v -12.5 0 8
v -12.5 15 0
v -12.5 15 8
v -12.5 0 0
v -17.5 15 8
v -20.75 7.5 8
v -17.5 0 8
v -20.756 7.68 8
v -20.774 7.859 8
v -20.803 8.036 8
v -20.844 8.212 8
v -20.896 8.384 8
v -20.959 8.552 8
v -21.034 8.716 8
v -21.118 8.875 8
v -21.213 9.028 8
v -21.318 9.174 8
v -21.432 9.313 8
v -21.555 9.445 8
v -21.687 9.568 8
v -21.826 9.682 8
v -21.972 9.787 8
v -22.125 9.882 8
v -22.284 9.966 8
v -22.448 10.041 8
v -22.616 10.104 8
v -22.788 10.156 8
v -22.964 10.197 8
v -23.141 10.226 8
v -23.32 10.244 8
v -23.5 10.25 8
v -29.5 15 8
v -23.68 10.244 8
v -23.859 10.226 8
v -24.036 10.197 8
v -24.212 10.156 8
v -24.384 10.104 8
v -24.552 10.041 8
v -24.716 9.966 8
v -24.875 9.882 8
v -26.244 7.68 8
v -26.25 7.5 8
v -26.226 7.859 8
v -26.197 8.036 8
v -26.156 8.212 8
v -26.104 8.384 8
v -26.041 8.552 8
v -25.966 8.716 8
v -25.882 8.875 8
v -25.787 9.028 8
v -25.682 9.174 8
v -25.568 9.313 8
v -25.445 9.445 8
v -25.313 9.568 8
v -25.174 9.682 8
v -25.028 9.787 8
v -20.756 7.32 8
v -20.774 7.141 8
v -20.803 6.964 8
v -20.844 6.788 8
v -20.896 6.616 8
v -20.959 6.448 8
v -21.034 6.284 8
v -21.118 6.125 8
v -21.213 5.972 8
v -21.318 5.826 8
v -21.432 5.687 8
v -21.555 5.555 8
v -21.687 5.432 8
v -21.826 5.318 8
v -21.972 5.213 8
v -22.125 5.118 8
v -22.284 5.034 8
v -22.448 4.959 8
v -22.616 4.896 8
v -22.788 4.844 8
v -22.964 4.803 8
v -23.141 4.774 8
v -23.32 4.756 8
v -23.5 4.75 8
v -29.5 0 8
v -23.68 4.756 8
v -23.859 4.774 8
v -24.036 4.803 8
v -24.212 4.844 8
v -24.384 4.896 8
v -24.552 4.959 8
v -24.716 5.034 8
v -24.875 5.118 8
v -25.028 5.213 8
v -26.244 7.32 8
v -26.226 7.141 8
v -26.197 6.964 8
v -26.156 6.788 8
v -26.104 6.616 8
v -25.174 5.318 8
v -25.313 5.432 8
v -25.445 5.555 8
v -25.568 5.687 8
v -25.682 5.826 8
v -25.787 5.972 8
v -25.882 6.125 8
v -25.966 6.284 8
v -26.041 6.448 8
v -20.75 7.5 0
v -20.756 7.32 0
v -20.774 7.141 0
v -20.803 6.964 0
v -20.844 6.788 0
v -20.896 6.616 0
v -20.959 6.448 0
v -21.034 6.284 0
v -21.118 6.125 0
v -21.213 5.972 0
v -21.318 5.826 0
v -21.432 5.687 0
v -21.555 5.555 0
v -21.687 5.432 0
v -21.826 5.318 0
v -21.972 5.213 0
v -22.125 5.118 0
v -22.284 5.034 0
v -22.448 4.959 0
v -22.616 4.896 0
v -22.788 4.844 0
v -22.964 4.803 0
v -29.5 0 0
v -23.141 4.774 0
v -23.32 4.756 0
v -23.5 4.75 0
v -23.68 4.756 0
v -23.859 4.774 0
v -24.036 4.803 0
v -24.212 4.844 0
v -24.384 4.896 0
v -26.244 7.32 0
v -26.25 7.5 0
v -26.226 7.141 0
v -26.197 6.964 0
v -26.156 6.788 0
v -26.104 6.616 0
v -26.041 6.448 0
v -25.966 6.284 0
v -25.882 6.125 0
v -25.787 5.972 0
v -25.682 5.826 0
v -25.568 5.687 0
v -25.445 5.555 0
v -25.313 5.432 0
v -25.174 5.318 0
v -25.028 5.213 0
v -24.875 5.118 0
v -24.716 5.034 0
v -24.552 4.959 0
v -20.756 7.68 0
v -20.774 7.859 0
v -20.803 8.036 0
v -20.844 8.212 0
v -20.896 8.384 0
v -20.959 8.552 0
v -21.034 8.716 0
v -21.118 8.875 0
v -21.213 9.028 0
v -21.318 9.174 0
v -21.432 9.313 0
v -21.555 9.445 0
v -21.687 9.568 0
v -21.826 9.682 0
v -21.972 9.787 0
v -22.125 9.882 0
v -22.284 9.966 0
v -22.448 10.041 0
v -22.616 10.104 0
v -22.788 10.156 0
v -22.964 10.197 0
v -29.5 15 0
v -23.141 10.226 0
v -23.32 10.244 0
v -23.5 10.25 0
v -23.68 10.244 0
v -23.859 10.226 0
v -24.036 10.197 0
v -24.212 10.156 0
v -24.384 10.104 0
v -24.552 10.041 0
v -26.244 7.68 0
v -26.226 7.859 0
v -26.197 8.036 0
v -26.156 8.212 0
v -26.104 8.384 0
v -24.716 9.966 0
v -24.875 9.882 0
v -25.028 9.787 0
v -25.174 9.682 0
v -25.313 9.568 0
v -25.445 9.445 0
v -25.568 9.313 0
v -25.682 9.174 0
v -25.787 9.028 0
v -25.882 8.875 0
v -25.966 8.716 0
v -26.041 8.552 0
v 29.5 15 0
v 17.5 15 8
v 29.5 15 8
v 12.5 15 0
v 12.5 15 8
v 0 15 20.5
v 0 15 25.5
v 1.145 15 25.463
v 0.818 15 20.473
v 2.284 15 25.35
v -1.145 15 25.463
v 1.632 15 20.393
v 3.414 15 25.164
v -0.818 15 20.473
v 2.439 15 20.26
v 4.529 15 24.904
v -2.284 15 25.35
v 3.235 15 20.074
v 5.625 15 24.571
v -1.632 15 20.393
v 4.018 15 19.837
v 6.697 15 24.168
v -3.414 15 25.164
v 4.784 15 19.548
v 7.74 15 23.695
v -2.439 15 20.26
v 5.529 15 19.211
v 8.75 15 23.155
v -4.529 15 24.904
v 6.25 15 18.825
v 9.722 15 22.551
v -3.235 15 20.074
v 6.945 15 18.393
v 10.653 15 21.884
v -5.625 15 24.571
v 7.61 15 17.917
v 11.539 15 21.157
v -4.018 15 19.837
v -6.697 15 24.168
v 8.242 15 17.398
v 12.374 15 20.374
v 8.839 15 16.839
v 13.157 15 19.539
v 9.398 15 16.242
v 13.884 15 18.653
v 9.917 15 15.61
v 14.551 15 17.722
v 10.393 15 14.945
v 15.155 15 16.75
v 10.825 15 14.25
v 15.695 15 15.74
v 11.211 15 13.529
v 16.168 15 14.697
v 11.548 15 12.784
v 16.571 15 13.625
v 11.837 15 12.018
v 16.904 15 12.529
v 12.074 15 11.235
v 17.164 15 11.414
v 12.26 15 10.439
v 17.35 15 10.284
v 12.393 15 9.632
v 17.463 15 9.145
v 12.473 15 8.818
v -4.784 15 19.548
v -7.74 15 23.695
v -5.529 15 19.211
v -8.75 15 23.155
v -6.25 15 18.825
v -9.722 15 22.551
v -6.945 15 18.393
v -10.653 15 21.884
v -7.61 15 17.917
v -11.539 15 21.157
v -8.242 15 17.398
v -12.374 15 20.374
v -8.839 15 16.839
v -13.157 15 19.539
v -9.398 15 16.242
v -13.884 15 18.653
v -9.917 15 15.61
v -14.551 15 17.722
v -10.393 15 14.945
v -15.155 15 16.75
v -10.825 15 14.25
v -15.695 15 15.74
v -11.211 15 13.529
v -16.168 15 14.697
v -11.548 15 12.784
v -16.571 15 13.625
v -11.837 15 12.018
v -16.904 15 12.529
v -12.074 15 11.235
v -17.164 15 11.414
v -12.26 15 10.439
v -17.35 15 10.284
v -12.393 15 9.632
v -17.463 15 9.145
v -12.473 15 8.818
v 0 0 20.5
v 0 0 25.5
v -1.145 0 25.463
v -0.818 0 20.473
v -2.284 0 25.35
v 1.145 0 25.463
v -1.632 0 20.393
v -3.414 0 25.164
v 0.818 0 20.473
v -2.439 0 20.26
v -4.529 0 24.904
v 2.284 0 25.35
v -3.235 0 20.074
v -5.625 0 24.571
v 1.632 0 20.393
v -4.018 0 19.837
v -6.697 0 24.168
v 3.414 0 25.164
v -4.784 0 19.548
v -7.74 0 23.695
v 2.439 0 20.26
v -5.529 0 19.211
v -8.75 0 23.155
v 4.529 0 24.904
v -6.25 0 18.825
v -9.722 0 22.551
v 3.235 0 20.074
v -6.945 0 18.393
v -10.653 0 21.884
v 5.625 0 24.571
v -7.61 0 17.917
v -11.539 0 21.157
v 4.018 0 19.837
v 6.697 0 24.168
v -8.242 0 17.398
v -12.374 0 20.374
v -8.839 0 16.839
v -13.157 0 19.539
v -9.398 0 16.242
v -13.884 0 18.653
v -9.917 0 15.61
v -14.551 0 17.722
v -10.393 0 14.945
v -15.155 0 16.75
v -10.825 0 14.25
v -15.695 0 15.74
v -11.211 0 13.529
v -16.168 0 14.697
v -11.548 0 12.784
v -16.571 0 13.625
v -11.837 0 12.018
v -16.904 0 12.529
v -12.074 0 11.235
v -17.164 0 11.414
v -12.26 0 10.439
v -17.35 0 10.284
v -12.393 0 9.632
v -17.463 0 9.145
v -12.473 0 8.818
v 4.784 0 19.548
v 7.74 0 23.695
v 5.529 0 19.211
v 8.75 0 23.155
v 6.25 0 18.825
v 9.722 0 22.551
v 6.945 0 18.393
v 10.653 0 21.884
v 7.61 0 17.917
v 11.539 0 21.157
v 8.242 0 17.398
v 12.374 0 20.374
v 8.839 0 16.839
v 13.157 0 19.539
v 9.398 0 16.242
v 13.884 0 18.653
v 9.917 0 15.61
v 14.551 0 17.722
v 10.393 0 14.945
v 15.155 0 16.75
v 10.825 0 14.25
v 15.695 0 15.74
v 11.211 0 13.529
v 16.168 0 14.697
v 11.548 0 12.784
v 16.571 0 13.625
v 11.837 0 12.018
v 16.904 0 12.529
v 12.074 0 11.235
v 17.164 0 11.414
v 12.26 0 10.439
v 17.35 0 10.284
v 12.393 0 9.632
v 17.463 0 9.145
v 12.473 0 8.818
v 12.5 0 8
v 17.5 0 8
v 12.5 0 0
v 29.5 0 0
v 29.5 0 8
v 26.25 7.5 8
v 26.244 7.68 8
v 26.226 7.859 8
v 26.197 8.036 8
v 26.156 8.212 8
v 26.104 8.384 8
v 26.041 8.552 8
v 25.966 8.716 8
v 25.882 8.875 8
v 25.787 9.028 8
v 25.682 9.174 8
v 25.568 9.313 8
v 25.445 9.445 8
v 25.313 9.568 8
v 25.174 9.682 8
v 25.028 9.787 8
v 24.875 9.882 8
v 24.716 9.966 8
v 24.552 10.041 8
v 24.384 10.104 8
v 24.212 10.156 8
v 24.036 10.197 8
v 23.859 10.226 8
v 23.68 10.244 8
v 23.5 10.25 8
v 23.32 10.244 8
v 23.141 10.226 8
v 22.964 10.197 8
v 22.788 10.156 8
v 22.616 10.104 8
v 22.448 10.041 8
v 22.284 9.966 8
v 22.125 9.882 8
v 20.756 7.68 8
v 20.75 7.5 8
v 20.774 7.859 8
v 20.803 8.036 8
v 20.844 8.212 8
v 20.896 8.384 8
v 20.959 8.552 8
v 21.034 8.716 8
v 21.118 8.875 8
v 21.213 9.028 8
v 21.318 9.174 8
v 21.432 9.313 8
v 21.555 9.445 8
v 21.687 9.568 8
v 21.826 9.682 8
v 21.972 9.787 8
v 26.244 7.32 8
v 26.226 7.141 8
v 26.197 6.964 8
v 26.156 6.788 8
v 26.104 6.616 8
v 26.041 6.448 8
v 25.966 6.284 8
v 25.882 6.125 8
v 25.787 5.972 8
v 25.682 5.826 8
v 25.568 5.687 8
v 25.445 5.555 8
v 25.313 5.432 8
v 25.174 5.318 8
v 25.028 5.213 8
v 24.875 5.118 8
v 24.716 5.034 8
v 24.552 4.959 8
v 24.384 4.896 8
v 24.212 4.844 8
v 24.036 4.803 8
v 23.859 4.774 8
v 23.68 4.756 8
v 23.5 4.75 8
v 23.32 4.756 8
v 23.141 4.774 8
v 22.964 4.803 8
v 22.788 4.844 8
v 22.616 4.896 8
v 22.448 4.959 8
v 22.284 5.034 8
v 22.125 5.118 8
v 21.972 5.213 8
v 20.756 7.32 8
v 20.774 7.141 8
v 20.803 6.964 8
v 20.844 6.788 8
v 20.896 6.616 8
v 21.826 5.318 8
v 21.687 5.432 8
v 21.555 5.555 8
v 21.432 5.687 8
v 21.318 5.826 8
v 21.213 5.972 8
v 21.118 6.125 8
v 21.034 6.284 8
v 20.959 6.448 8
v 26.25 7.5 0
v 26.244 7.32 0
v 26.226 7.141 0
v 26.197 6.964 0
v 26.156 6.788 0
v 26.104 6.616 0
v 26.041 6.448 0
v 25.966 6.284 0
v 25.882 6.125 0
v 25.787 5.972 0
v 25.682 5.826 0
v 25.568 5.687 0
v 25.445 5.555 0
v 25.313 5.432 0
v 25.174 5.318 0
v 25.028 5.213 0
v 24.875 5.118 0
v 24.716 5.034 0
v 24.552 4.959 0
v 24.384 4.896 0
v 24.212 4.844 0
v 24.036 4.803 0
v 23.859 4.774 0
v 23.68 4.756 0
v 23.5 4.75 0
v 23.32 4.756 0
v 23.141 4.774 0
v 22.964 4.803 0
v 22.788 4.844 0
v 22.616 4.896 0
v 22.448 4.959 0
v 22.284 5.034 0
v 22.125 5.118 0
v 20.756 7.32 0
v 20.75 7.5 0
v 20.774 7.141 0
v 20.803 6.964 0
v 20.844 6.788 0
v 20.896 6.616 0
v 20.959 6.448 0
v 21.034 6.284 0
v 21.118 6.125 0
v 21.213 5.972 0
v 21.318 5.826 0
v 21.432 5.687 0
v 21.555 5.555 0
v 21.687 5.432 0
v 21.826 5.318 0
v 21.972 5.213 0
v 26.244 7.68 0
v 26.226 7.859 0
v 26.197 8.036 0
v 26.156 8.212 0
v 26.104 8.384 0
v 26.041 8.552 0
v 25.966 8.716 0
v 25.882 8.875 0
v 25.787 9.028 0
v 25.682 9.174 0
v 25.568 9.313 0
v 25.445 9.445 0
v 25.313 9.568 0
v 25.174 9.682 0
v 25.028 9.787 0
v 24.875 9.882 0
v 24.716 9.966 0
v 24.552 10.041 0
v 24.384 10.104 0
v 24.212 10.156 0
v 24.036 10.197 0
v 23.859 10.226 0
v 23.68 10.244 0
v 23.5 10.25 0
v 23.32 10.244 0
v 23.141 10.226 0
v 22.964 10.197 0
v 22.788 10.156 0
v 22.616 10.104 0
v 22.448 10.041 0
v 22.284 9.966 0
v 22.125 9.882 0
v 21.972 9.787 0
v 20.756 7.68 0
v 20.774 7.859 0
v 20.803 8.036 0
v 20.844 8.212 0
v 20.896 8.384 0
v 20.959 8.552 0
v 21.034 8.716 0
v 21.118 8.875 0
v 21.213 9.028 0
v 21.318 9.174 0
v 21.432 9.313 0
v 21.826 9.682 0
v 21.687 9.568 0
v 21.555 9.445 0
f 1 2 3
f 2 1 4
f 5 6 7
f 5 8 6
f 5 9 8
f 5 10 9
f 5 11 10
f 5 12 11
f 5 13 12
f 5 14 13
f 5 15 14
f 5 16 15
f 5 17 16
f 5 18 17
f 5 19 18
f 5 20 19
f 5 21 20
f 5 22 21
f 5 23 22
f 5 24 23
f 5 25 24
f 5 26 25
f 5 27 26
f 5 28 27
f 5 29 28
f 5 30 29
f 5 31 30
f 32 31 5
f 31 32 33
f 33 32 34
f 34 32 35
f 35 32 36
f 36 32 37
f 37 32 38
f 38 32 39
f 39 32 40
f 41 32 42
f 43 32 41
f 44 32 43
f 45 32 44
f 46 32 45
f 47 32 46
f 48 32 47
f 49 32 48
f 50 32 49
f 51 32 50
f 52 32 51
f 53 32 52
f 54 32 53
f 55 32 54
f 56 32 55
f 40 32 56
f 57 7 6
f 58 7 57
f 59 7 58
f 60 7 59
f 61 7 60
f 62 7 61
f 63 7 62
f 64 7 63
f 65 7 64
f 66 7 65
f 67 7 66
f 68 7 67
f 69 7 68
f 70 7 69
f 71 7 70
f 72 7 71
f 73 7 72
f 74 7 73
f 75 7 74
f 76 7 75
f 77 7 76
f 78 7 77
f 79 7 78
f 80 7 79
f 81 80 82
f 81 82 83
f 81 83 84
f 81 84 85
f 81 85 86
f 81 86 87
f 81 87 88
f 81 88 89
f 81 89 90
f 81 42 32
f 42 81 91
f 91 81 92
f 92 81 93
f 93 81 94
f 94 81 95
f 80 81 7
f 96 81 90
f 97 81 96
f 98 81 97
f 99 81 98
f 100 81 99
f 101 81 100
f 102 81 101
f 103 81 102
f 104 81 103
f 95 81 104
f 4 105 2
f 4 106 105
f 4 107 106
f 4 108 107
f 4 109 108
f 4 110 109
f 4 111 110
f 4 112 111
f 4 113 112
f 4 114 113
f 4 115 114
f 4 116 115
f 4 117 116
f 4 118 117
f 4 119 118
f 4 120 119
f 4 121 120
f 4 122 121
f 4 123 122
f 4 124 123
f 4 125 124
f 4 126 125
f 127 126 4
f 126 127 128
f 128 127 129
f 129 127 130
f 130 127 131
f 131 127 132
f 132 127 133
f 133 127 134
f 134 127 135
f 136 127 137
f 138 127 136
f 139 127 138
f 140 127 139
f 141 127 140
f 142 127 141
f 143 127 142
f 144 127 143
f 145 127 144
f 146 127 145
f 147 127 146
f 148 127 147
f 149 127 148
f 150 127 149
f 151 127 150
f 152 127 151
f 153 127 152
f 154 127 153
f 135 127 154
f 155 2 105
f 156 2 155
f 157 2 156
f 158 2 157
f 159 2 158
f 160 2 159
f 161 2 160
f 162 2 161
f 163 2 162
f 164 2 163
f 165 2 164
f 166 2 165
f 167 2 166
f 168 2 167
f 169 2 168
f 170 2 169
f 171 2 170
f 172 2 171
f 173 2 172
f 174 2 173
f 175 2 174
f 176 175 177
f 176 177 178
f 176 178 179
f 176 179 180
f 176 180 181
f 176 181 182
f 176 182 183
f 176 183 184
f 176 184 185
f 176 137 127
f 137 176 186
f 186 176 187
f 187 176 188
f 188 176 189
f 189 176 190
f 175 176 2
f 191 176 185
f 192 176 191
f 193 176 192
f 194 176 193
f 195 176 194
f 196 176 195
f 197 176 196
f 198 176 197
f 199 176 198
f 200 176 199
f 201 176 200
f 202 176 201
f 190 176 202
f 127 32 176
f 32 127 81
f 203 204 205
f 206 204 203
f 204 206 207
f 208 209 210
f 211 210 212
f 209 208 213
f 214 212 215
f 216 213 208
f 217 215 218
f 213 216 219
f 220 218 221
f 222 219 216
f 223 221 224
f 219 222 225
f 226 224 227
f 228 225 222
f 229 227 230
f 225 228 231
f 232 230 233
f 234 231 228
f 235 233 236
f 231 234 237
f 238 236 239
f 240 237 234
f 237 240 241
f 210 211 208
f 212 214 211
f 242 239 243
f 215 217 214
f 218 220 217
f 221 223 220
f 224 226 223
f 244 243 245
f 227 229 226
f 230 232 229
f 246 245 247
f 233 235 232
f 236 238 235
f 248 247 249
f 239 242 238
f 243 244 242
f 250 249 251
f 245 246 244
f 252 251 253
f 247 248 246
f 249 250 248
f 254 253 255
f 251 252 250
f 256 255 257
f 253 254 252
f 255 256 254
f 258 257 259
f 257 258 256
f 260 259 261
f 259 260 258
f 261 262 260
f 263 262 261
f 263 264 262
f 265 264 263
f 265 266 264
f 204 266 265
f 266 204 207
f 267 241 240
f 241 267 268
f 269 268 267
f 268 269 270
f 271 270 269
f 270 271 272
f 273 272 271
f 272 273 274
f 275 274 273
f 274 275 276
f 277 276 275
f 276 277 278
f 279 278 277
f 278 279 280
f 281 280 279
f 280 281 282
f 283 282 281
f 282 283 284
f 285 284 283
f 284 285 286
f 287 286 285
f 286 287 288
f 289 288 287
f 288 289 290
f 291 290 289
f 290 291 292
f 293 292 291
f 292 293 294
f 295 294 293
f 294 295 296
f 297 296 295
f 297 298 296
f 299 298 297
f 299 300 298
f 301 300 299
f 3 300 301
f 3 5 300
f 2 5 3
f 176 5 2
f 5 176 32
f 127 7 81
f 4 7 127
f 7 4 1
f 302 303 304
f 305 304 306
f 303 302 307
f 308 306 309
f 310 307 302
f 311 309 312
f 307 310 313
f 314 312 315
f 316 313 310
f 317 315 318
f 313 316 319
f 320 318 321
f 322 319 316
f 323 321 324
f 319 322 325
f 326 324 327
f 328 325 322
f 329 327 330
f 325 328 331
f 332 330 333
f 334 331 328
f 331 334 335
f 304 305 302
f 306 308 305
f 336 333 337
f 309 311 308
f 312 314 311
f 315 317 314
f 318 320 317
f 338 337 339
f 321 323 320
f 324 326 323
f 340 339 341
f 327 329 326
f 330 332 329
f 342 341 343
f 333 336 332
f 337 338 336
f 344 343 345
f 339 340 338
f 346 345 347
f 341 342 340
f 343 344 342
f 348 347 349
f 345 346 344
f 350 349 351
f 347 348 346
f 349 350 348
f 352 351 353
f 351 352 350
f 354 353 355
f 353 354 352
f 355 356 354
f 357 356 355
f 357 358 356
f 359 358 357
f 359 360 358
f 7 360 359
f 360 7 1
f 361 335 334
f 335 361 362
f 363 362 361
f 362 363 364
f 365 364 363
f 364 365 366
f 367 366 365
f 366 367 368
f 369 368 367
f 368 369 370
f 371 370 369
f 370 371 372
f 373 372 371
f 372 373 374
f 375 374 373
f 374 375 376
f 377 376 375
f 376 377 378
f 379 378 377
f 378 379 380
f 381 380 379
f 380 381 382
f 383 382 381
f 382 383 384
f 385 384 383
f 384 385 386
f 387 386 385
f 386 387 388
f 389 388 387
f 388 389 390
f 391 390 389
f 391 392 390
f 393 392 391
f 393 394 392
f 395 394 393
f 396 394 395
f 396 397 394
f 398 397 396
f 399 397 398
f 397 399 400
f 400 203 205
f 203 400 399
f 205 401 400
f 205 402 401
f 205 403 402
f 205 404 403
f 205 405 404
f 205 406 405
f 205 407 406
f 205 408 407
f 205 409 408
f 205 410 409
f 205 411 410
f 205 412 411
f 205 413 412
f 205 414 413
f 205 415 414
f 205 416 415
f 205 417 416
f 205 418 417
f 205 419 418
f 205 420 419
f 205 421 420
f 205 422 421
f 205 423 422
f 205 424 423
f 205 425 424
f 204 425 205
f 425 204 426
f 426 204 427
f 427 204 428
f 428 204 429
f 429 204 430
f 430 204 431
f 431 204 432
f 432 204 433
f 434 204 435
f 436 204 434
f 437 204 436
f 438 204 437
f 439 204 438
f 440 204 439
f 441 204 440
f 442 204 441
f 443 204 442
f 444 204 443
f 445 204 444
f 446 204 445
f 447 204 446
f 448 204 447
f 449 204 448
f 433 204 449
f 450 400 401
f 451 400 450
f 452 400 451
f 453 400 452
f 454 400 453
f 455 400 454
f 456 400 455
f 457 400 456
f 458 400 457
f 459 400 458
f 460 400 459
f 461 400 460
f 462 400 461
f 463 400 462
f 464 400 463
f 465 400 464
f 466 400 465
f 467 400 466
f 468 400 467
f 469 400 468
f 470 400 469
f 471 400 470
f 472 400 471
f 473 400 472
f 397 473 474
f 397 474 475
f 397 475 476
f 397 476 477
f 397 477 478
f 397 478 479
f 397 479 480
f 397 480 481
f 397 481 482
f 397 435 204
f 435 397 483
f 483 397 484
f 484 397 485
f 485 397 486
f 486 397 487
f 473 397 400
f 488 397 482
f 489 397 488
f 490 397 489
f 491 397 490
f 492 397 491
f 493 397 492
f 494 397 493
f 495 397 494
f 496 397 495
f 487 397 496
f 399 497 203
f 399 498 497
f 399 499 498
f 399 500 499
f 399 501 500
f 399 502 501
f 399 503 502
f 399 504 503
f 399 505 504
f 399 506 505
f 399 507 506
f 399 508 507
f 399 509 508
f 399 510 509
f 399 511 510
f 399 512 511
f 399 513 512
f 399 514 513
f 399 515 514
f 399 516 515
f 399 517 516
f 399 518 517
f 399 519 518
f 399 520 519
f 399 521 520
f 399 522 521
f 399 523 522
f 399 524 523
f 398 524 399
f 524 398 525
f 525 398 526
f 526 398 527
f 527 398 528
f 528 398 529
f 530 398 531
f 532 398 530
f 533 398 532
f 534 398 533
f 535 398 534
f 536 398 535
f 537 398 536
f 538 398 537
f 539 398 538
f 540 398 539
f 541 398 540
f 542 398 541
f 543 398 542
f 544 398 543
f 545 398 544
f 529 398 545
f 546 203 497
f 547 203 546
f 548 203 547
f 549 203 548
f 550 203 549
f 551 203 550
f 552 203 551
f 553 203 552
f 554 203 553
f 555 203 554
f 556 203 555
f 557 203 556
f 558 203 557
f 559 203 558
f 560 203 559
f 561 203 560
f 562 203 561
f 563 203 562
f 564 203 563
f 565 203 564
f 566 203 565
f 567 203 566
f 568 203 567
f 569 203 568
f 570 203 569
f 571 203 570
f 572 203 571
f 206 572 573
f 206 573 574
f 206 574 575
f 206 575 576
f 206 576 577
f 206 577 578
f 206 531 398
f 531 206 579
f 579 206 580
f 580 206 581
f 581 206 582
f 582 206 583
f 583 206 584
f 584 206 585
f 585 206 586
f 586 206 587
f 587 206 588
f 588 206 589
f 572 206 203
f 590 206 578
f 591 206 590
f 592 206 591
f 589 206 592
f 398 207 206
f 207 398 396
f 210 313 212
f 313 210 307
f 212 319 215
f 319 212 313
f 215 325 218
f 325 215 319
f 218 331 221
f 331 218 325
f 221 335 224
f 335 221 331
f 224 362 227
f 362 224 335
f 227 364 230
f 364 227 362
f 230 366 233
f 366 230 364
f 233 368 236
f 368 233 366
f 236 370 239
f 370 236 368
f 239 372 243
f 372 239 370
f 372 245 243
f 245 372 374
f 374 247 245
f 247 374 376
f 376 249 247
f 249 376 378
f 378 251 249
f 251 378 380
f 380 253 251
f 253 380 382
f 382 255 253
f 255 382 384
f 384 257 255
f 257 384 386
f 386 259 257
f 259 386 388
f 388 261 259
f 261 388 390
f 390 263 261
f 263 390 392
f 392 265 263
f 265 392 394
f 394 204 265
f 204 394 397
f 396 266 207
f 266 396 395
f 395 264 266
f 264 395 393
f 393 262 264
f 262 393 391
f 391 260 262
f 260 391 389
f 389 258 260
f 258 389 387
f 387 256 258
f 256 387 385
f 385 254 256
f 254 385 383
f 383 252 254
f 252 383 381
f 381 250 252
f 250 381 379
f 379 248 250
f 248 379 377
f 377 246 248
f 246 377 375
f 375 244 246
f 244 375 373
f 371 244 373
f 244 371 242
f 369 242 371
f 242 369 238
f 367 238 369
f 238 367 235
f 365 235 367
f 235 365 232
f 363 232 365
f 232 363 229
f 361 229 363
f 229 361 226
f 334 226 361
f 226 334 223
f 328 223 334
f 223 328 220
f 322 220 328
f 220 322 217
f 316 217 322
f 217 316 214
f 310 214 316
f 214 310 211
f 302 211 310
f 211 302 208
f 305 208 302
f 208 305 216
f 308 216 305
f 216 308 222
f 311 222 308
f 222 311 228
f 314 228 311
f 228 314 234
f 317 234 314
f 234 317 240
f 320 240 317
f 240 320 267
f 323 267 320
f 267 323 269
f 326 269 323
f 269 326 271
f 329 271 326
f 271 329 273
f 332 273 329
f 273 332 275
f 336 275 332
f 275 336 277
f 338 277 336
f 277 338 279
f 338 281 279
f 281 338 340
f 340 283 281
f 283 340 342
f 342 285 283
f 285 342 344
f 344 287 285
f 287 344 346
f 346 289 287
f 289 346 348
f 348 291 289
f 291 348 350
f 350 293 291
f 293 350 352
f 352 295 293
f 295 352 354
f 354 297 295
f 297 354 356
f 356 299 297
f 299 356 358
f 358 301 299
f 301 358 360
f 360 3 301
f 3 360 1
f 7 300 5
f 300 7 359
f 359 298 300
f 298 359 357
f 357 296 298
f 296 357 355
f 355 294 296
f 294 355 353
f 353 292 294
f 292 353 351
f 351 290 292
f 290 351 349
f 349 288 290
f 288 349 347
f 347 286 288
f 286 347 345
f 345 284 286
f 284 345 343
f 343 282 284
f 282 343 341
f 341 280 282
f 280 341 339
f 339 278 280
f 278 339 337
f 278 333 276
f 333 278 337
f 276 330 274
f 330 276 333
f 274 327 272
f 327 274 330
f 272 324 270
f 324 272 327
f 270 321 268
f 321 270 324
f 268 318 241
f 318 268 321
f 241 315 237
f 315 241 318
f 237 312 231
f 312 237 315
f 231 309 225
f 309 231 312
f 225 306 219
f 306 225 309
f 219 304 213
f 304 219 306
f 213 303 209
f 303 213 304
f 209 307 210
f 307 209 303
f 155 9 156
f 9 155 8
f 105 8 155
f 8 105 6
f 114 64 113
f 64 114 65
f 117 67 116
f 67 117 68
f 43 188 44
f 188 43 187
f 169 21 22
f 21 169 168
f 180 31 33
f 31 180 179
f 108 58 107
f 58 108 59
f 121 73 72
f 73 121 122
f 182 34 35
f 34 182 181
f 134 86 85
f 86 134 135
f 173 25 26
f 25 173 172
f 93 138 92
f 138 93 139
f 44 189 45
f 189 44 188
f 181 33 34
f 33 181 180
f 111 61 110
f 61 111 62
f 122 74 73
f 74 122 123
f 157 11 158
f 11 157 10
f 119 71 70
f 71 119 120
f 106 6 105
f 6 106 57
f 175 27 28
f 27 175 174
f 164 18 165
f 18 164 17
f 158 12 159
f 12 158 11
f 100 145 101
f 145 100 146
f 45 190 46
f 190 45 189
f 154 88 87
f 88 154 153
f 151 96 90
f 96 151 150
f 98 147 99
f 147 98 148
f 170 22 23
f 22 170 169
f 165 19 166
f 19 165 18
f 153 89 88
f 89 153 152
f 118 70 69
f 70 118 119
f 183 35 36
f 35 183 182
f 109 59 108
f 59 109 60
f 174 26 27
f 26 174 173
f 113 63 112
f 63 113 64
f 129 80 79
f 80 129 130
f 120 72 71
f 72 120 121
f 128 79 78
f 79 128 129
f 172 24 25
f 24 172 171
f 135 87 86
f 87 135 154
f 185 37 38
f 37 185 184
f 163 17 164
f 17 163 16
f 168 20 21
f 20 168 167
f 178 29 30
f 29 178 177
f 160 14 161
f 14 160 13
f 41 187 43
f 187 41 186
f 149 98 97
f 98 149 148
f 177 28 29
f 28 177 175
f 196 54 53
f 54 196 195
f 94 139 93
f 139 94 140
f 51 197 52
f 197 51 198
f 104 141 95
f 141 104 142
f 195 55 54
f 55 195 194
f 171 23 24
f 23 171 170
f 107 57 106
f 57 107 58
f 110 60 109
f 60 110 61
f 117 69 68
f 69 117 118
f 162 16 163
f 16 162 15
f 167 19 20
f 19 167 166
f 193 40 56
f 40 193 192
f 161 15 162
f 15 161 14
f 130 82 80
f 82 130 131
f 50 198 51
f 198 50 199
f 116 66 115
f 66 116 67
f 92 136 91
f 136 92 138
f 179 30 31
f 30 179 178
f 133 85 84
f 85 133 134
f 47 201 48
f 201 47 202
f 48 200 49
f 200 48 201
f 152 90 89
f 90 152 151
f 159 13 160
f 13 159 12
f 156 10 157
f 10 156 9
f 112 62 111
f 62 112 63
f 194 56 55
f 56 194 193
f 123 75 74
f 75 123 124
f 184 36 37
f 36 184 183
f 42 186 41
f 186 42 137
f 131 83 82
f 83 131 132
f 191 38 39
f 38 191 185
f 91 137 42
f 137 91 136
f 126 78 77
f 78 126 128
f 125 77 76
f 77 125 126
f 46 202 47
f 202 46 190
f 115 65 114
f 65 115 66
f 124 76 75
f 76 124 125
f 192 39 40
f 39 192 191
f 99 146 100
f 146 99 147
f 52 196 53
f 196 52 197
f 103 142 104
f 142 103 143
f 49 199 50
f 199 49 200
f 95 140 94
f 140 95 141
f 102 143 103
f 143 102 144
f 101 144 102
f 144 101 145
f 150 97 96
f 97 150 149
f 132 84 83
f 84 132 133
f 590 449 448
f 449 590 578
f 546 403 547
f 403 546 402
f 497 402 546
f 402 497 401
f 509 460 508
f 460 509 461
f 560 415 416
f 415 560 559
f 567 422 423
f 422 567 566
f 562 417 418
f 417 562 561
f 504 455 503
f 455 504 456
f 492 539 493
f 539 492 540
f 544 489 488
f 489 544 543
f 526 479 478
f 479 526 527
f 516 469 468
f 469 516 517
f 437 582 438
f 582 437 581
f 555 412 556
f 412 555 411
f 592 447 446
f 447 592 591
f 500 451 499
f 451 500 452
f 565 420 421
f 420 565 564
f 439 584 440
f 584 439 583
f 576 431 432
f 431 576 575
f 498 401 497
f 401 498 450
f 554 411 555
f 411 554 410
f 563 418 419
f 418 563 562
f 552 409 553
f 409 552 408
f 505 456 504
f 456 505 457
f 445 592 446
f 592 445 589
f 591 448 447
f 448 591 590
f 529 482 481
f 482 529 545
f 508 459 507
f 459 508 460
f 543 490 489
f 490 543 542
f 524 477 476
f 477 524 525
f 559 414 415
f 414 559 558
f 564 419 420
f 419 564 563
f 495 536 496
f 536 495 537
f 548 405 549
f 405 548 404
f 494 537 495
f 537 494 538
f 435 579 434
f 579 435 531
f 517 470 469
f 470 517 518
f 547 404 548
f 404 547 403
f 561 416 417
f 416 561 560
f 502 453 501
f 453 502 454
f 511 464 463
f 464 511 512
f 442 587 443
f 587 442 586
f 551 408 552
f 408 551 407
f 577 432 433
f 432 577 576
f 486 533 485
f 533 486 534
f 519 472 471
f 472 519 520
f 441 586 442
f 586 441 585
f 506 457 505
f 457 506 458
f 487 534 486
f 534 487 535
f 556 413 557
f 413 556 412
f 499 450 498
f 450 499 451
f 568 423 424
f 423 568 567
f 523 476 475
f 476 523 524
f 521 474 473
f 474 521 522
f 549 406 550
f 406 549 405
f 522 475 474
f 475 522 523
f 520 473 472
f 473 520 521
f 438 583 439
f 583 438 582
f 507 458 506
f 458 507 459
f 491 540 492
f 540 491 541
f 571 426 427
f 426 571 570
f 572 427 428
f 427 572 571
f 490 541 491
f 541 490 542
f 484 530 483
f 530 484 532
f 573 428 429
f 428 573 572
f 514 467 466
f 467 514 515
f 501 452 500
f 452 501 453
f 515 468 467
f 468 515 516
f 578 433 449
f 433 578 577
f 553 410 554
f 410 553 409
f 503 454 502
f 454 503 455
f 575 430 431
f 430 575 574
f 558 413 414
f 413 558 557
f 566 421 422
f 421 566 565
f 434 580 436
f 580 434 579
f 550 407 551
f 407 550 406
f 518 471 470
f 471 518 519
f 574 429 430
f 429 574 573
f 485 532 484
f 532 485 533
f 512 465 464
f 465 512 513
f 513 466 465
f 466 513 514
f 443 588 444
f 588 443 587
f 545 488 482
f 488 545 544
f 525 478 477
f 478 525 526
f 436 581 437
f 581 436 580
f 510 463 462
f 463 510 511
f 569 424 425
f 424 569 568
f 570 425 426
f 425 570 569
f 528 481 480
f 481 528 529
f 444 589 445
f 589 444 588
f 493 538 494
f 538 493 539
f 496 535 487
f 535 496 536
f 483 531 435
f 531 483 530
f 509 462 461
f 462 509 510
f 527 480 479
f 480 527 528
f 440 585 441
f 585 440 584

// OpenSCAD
// t2-008 bolted hose clamp jaw half
$fn = 96;
hose_diameter = 25;
wall_thickness = 5;
jaw_width = 15;
axis_z = 8;
r_in = hose_diameter / 2;
r_out = r_in + wall_thickness;
flange_inner_x = 12.5;
flange_outer_x = 29.5;
flange_thickness = 8;
bolt_x = 23.5;
bolt_diameter = 5.5;

difference() {
    union() {
        // semicircular arch above the axis, extruded along +Y
        translate([0, 0, axis_z]) rotate([-90, 0, 0])
            linear_extrude(jaw_width)
                difference() {
                    circle(r = r_out);
                    circle(r = r_in);
                    translate([-r_out - 1, 0]) square([2 * r_out + 2, r_out + 1]); // drop lower half (sketch +Y maps to -Z)
                }
        for (s = [-1, 1])
            translate([s > 0 ? flange_inner_x : -flange_outer_x, 0, 0])
                cube([flange_outer_x - flange_inner_x, jaw_width, flange_thickness]);
    }
    for (s = [-1, 1])
        translate([s * bolt_x, jaw_width / 2, -1])
            cylinder(d = bolt_diameter, h = flange_thickness + 2);
}
